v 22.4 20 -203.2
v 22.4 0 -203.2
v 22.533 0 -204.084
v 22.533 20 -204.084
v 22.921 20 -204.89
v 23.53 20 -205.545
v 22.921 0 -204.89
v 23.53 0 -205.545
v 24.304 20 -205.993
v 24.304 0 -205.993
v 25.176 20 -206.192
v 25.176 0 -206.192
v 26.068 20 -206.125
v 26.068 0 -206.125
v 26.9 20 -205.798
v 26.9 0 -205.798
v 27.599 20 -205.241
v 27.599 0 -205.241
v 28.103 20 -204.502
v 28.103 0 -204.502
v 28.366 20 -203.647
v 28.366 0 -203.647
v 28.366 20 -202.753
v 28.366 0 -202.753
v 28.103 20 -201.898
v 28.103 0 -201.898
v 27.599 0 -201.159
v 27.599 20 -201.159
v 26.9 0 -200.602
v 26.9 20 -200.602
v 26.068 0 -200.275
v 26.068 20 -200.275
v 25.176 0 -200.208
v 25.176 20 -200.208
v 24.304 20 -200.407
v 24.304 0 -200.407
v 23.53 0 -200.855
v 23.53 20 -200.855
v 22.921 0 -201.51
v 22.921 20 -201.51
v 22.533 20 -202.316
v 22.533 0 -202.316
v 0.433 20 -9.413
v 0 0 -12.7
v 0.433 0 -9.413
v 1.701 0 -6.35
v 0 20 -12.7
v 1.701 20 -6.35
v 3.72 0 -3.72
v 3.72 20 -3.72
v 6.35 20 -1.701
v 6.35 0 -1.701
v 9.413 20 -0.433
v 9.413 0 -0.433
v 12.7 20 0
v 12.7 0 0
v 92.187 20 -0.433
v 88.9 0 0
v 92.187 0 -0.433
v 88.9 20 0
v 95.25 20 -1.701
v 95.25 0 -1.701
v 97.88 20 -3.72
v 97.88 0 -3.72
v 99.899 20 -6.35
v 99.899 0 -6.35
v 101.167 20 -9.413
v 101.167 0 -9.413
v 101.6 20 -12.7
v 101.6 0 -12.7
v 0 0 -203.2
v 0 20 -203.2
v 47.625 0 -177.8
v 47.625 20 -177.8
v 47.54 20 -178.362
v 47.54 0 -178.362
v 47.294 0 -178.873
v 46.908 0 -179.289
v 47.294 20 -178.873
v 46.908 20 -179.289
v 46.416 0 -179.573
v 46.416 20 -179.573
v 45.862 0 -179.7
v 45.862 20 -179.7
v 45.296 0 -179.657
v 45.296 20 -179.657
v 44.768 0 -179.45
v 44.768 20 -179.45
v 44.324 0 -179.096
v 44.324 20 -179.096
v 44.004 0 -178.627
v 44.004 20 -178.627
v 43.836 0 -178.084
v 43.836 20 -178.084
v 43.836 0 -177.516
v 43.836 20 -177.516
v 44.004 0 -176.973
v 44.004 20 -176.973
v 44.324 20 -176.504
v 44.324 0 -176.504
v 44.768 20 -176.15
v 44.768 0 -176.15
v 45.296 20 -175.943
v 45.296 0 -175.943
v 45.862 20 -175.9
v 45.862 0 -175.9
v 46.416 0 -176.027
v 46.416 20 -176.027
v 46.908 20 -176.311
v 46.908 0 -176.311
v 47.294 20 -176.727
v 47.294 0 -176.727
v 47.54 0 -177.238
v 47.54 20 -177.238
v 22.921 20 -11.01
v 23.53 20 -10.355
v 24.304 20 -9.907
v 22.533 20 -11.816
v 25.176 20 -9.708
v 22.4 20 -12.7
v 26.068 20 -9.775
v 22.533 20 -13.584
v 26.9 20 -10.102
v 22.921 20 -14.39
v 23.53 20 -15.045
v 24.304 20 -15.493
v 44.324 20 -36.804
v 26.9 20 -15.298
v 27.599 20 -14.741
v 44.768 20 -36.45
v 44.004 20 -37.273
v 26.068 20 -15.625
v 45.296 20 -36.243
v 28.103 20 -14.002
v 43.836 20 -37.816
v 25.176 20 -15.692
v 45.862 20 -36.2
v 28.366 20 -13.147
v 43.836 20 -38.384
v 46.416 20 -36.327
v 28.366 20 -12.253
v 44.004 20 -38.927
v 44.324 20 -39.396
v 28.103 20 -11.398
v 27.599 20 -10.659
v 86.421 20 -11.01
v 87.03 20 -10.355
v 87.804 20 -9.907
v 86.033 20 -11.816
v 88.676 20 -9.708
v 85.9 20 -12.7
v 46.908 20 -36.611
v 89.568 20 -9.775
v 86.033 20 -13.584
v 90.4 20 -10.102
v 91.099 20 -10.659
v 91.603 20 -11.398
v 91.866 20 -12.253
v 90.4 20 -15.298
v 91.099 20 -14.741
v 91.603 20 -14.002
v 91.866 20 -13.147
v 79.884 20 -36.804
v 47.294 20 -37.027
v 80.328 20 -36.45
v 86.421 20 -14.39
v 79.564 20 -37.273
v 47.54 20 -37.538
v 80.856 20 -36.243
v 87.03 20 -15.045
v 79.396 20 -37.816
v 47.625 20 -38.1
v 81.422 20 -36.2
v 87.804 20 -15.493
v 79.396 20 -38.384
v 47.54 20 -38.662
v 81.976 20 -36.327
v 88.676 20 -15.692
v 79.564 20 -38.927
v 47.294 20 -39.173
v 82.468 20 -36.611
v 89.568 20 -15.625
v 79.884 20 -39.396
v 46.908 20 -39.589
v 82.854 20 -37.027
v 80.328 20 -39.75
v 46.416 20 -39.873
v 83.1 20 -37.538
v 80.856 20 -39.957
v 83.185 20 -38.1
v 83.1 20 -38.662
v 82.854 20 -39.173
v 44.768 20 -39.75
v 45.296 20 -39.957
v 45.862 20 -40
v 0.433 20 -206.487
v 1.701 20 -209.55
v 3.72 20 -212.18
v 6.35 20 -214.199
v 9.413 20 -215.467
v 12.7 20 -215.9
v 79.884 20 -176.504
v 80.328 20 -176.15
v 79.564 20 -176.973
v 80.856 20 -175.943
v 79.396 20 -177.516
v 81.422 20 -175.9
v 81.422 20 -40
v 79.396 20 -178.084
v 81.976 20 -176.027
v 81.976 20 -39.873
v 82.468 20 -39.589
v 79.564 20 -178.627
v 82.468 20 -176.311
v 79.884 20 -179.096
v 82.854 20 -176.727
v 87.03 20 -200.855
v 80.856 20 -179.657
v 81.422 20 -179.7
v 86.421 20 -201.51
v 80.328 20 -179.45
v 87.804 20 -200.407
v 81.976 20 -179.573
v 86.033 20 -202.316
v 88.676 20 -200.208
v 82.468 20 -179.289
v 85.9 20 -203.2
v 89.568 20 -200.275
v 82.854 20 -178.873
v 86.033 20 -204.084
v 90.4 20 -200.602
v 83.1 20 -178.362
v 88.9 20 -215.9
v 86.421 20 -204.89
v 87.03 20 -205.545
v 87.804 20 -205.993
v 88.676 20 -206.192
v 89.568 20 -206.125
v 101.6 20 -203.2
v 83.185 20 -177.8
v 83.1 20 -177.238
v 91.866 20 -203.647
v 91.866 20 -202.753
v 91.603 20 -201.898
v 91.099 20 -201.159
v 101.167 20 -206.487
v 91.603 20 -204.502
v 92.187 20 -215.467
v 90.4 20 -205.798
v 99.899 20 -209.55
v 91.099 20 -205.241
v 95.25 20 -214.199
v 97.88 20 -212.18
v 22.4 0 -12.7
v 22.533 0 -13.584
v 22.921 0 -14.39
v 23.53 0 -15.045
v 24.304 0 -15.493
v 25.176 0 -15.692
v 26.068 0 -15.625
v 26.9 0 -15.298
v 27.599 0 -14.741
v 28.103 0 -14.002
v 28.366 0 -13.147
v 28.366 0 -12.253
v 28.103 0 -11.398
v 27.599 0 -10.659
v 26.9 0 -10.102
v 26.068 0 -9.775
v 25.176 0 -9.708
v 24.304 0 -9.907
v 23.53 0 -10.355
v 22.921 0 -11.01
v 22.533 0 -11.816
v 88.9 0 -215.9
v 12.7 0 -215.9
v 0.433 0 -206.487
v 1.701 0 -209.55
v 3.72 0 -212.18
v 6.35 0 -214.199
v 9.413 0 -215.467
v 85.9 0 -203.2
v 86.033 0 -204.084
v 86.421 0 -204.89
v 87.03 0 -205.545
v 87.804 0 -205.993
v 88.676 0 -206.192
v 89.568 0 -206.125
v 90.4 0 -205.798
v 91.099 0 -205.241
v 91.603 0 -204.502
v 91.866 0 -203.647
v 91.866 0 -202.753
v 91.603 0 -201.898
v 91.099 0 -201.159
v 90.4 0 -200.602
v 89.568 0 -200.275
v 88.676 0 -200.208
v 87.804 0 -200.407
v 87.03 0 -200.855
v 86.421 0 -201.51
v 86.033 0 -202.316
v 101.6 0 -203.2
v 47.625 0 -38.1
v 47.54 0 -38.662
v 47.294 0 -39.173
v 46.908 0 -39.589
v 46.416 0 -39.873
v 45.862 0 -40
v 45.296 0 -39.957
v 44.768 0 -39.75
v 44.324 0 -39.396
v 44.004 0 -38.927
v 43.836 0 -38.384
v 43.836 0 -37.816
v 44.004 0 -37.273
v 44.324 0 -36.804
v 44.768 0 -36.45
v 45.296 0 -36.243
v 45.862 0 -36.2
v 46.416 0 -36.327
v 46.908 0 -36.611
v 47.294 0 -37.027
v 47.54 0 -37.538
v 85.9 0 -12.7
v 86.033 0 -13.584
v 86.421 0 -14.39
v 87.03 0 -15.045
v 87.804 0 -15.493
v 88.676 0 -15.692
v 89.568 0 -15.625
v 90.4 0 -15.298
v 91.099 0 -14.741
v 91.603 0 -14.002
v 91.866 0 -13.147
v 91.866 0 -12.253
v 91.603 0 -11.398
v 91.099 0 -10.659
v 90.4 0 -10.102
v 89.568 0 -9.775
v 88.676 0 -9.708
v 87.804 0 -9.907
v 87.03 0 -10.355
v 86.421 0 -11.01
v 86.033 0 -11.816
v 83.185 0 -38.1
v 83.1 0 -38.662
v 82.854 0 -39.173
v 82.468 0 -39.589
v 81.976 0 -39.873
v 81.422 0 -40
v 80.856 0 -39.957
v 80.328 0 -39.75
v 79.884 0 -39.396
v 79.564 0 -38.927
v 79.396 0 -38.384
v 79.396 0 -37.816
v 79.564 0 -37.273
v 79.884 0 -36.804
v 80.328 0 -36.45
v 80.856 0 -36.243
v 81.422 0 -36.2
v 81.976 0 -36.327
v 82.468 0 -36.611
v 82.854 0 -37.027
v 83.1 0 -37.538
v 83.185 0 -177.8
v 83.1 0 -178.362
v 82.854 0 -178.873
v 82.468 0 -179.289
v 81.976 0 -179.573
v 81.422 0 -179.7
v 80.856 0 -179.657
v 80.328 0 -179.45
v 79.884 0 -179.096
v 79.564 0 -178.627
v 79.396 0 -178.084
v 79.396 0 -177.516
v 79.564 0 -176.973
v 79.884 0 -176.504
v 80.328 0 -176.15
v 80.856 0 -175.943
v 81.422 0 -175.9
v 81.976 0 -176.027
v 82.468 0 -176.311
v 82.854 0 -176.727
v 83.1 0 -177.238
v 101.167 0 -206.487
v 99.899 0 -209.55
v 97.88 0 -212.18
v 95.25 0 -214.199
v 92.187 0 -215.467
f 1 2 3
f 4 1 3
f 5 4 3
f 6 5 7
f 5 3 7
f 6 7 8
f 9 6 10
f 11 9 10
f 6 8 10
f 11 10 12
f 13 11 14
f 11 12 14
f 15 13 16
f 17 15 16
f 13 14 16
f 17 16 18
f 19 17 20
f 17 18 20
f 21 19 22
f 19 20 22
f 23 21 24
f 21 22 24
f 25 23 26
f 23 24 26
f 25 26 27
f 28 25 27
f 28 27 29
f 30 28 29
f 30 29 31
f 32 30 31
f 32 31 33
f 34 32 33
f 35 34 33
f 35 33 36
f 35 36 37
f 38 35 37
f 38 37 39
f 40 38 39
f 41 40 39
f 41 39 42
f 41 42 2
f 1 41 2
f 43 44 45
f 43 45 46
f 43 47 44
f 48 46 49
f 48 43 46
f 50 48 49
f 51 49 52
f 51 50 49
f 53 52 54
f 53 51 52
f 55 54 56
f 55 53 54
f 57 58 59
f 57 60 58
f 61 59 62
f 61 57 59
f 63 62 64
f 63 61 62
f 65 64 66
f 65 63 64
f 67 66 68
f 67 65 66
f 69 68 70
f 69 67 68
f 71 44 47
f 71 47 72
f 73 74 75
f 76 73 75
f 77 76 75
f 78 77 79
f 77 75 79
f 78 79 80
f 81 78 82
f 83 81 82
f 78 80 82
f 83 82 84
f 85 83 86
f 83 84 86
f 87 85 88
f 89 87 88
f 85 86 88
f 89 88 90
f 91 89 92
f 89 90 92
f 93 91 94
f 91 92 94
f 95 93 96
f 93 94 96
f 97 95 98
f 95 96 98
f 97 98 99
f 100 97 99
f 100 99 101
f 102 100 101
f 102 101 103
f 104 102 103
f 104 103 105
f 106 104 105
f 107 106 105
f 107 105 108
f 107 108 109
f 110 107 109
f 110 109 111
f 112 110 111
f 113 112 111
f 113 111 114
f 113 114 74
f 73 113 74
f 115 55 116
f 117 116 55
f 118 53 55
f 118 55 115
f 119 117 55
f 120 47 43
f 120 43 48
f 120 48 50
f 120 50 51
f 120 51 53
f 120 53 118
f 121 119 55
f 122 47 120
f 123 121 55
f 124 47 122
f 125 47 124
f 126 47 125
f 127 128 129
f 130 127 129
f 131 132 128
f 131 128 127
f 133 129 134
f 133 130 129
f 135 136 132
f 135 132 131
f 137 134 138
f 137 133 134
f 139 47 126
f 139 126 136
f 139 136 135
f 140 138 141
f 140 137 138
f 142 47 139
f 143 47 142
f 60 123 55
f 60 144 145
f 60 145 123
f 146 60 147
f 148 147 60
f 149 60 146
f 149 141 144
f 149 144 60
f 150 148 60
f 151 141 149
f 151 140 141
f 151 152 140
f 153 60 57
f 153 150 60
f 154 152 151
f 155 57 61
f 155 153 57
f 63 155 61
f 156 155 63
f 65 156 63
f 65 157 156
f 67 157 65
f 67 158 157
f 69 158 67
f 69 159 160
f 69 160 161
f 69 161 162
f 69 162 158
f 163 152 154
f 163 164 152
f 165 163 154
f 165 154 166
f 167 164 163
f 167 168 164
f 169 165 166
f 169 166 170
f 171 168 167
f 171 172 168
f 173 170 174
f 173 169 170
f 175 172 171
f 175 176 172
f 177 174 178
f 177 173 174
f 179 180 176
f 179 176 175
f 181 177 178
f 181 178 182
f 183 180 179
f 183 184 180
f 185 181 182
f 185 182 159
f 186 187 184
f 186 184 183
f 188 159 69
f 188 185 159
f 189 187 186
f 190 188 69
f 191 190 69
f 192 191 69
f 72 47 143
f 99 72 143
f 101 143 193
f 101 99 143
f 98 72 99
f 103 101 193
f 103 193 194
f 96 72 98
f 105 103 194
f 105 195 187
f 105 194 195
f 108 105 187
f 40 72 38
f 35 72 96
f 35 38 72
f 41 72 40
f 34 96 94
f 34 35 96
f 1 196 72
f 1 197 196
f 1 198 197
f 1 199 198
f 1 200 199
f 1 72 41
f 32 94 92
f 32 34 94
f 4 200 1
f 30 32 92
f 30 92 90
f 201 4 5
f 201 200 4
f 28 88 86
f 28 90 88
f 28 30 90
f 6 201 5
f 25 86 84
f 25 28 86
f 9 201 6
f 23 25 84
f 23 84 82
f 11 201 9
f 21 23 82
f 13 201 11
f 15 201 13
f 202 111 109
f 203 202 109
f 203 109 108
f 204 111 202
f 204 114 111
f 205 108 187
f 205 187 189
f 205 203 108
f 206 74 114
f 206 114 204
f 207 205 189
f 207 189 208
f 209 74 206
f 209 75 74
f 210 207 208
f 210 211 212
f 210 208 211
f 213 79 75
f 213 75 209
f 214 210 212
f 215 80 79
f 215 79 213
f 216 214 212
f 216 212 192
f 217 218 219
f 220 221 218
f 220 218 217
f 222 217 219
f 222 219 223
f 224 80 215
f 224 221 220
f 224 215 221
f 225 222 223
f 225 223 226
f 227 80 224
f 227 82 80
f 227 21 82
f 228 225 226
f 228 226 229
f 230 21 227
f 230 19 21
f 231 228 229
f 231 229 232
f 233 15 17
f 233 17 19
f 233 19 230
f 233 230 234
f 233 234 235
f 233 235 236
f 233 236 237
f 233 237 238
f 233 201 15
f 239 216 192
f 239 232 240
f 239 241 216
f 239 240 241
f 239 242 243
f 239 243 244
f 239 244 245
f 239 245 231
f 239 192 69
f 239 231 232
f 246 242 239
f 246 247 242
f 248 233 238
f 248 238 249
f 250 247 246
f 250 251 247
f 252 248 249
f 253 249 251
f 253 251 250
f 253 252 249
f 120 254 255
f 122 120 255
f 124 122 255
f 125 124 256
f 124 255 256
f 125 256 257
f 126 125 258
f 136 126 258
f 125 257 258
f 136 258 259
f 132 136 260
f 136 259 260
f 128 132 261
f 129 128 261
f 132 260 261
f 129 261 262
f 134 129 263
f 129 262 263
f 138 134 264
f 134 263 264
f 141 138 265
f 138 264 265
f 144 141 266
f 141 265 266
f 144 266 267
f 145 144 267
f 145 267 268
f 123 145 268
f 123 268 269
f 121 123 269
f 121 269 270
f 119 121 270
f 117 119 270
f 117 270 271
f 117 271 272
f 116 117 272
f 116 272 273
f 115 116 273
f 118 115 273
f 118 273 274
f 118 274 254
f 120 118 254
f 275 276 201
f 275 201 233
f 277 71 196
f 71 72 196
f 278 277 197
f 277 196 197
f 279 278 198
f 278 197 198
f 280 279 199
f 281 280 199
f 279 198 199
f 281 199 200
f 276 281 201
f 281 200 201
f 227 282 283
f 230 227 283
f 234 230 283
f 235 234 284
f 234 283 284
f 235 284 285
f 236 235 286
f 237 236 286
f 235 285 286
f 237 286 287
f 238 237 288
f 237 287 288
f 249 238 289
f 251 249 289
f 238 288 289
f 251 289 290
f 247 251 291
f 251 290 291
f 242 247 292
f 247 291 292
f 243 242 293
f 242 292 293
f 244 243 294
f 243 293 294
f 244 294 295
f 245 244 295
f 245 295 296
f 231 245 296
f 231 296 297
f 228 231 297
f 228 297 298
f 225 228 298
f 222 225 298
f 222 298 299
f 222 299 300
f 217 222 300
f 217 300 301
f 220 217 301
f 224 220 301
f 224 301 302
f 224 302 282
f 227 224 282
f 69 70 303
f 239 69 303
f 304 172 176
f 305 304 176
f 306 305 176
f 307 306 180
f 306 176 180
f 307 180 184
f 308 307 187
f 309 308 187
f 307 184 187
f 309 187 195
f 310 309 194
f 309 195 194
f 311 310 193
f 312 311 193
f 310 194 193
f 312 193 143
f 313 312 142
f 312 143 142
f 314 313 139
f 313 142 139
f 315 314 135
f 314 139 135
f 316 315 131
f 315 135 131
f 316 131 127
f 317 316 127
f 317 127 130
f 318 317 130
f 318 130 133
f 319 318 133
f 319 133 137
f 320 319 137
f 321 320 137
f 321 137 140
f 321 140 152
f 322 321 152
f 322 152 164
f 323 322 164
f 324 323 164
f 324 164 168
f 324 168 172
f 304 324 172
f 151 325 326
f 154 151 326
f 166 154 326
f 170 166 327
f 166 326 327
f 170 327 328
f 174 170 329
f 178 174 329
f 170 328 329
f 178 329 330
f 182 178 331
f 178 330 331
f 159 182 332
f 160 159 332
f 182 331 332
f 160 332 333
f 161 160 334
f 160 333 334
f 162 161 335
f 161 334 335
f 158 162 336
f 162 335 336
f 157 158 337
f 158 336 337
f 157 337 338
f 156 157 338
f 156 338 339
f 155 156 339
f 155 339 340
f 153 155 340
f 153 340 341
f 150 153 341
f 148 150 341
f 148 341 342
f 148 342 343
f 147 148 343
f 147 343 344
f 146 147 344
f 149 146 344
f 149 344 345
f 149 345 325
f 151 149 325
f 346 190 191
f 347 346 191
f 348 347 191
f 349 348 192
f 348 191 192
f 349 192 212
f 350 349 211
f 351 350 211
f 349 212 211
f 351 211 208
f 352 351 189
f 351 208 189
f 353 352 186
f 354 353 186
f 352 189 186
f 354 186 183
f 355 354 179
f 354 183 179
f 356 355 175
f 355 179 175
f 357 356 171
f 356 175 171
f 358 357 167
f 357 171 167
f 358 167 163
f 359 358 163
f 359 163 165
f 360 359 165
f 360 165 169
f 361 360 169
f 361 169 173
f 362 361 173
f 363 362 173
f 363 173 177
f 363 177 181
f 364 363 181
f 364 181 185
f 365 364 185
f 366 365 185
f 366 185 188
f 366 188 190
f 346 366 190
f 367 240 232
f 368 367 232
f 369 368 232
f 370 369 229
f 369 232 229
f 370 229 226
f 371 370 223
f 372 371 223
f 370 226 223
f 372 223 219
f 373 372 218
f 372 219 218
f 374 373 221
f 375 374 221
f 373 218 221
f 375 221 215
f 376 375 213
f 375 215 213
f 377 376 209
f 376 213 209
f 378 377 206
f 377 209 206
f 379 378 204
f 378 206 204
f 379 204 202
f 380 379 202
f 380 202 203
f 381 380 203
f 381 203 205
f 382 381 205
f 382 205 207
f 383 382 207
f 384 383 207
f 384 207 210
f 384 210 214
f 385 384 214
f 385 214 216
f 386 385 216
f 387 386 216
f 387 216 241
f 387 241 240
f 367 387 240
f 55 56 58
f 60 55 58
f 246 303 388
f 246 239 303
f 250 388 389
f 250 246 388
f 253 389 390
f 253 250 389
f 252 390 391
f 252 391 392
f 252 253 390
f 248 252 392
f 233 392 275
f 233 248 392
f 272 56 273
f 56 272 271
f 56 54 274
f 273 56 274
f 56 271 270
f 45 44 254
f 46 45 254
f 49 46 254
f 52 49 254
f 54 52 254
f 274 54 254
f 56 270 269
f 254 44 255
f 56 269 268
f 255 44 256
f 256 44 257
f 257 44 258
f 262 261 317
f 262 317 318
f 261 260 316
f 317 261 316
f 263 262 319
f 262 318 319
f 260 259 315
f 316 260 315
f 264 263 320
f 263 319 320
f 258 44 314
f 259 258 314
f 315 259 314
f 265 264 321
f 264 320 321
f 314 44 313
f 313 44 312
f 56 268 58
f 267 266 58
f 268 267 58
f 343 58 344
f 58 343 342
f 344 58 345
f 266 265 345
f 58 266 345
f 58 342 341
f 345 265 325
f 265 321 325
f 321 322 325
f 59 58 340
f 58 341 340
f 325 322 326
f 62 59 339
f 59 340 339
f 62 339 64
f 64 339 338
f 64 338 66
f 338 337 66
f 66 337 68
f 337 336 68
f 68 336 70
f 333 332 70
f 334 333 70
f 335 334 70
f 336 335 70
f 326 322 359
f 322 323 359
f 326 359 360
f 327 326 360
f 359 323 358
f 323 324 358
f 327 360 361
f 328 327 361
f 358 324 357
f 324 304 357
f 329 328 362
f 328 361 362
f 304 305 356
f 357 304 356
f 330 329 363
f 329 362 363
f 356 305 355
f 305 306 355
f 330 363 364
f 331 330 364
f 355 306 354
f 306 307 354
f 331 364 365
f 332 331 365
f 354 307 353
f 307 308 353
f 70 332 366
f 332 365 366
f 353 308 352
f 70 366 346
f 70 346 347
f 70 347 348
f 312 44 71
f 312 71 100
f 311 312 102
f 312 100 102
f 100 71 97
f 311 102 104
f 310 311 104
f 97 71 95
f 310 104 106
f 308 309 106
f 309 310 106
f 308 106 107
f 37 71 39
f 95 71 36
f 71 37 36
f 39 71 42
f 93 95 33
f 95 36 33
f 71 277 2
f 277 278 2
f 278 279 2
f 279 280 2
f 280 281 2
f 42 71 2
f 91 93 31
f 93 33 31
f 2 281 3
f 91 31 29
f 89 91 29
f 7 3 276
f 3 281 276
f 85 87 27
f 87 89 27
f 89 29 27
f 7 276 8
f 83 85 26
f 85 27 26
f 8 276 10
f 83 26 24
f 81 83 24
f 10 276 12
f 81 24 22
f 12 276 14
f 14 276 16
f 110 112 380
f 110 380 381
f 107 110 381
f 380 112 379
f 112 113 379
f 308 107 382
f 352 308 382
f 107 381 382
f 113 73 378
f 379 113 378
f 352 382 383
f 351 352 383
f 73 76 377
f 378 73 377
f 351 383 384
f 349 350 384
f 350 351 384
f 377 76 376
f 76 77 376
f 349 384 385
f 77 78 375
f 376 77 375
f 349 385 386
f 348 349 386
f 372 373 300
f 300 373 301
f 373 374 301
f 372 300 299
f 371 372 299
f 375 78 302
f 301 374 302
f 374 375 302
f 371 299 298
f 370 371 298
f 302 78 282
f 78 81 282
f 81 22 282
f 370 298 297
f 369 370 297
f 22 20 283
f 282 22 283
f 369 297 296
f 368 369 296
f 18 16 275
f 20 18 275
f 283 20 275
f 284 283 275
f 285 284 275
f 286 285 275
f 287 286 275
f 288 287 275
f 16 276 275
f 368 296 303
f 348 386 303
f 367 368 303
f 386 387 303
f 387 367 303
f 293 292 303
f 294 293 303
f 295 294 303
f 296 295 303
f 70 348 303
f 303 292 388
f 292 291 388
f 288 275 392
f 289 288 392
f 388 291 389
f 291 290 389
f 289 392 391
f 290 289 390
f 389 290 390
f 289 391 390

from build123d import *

# Parameters (mm, degrees)
SKETCH1_W           = 101.6
SKETCH1_H           = 215.9
BOSS_EXTRUDE2_DEPTH = 20
FILLET1_R           = 12.7
SKETCH5_R           = 3
CUT_EXTRUDE1_DEPTH  = 21
SKETCH7_R           = 1.905
CUT_EXTRUDE2_DEPTH  = 21


with BuildPart() as part:
    # Sketch1 → Boss-Extrude2 (new body)
    with BuildSketch(Plane(origin=(0, 0, 0), x_dir=(1, 0, 0), z_dir=(0, 1, 0))):
        with Locations((50.8, 107.95)):
            Rectangle(SKETCH1_W, SKETCH1_H)
    extrude(amount=BOSS_EXTRUDE2_DEPTH)

    # Fillet1
    fillet1_edges = [part.edges().sort_by_distance(p)[0] for p in [
        (0, 10, -215.9),
        (101.6, 10, -215.9),
        (101.6, 10, 0),
        (0, 10, 0),
    ]]
    fillet(fillet1_edges, radius=FILLET1_R)

    # Sketch5 → Cut-Extrude1 (cut, through all)
    with BuildSketch(Plane(origin=(0, 0, 0), x_dir=(-1, 0, 0), z_dir=(0, -1, 0))):
        with Locations((-88.9, 203.2)):
            Circle(SKETCH5_R)
        with Locations((-25.4, 203.2)):
            Circle(SKETCH5_R)
        with Locations((-88.9, 12.7)):
            Circle(SKETCH5_R)
        with Locations((-25.4, 12.7)):
            Circle(SKETCH5_R)
    extrude(amount=-CUT_EXTRUDE1_DEPTH, mode=Mode.SUBTRACT)

    # Sketch7 → Cut-Extrude2 (cut, through all)
    with BuildSketch(Plane(origin=(0, 20, 0), x_dir=(1, 0, 0), z_dir=(0, 1, 0))):
        with Locations((81.28, 177.8)):
            Circle(SKETCH7_R)
        with Locations((45.72, 177.8)):
            Circle(SKETCH7_R)
        with Locations((45.72, 38.1)):
            Circle(SKETCH7_R)
        with Locations((81.28, 38.1)):
            Circle(SKETCH7_R)
    extrude(amount=-CUT_EXTRUDE2_DEPTH, mode=Mode.SUBTRACT)


solid = part.part
